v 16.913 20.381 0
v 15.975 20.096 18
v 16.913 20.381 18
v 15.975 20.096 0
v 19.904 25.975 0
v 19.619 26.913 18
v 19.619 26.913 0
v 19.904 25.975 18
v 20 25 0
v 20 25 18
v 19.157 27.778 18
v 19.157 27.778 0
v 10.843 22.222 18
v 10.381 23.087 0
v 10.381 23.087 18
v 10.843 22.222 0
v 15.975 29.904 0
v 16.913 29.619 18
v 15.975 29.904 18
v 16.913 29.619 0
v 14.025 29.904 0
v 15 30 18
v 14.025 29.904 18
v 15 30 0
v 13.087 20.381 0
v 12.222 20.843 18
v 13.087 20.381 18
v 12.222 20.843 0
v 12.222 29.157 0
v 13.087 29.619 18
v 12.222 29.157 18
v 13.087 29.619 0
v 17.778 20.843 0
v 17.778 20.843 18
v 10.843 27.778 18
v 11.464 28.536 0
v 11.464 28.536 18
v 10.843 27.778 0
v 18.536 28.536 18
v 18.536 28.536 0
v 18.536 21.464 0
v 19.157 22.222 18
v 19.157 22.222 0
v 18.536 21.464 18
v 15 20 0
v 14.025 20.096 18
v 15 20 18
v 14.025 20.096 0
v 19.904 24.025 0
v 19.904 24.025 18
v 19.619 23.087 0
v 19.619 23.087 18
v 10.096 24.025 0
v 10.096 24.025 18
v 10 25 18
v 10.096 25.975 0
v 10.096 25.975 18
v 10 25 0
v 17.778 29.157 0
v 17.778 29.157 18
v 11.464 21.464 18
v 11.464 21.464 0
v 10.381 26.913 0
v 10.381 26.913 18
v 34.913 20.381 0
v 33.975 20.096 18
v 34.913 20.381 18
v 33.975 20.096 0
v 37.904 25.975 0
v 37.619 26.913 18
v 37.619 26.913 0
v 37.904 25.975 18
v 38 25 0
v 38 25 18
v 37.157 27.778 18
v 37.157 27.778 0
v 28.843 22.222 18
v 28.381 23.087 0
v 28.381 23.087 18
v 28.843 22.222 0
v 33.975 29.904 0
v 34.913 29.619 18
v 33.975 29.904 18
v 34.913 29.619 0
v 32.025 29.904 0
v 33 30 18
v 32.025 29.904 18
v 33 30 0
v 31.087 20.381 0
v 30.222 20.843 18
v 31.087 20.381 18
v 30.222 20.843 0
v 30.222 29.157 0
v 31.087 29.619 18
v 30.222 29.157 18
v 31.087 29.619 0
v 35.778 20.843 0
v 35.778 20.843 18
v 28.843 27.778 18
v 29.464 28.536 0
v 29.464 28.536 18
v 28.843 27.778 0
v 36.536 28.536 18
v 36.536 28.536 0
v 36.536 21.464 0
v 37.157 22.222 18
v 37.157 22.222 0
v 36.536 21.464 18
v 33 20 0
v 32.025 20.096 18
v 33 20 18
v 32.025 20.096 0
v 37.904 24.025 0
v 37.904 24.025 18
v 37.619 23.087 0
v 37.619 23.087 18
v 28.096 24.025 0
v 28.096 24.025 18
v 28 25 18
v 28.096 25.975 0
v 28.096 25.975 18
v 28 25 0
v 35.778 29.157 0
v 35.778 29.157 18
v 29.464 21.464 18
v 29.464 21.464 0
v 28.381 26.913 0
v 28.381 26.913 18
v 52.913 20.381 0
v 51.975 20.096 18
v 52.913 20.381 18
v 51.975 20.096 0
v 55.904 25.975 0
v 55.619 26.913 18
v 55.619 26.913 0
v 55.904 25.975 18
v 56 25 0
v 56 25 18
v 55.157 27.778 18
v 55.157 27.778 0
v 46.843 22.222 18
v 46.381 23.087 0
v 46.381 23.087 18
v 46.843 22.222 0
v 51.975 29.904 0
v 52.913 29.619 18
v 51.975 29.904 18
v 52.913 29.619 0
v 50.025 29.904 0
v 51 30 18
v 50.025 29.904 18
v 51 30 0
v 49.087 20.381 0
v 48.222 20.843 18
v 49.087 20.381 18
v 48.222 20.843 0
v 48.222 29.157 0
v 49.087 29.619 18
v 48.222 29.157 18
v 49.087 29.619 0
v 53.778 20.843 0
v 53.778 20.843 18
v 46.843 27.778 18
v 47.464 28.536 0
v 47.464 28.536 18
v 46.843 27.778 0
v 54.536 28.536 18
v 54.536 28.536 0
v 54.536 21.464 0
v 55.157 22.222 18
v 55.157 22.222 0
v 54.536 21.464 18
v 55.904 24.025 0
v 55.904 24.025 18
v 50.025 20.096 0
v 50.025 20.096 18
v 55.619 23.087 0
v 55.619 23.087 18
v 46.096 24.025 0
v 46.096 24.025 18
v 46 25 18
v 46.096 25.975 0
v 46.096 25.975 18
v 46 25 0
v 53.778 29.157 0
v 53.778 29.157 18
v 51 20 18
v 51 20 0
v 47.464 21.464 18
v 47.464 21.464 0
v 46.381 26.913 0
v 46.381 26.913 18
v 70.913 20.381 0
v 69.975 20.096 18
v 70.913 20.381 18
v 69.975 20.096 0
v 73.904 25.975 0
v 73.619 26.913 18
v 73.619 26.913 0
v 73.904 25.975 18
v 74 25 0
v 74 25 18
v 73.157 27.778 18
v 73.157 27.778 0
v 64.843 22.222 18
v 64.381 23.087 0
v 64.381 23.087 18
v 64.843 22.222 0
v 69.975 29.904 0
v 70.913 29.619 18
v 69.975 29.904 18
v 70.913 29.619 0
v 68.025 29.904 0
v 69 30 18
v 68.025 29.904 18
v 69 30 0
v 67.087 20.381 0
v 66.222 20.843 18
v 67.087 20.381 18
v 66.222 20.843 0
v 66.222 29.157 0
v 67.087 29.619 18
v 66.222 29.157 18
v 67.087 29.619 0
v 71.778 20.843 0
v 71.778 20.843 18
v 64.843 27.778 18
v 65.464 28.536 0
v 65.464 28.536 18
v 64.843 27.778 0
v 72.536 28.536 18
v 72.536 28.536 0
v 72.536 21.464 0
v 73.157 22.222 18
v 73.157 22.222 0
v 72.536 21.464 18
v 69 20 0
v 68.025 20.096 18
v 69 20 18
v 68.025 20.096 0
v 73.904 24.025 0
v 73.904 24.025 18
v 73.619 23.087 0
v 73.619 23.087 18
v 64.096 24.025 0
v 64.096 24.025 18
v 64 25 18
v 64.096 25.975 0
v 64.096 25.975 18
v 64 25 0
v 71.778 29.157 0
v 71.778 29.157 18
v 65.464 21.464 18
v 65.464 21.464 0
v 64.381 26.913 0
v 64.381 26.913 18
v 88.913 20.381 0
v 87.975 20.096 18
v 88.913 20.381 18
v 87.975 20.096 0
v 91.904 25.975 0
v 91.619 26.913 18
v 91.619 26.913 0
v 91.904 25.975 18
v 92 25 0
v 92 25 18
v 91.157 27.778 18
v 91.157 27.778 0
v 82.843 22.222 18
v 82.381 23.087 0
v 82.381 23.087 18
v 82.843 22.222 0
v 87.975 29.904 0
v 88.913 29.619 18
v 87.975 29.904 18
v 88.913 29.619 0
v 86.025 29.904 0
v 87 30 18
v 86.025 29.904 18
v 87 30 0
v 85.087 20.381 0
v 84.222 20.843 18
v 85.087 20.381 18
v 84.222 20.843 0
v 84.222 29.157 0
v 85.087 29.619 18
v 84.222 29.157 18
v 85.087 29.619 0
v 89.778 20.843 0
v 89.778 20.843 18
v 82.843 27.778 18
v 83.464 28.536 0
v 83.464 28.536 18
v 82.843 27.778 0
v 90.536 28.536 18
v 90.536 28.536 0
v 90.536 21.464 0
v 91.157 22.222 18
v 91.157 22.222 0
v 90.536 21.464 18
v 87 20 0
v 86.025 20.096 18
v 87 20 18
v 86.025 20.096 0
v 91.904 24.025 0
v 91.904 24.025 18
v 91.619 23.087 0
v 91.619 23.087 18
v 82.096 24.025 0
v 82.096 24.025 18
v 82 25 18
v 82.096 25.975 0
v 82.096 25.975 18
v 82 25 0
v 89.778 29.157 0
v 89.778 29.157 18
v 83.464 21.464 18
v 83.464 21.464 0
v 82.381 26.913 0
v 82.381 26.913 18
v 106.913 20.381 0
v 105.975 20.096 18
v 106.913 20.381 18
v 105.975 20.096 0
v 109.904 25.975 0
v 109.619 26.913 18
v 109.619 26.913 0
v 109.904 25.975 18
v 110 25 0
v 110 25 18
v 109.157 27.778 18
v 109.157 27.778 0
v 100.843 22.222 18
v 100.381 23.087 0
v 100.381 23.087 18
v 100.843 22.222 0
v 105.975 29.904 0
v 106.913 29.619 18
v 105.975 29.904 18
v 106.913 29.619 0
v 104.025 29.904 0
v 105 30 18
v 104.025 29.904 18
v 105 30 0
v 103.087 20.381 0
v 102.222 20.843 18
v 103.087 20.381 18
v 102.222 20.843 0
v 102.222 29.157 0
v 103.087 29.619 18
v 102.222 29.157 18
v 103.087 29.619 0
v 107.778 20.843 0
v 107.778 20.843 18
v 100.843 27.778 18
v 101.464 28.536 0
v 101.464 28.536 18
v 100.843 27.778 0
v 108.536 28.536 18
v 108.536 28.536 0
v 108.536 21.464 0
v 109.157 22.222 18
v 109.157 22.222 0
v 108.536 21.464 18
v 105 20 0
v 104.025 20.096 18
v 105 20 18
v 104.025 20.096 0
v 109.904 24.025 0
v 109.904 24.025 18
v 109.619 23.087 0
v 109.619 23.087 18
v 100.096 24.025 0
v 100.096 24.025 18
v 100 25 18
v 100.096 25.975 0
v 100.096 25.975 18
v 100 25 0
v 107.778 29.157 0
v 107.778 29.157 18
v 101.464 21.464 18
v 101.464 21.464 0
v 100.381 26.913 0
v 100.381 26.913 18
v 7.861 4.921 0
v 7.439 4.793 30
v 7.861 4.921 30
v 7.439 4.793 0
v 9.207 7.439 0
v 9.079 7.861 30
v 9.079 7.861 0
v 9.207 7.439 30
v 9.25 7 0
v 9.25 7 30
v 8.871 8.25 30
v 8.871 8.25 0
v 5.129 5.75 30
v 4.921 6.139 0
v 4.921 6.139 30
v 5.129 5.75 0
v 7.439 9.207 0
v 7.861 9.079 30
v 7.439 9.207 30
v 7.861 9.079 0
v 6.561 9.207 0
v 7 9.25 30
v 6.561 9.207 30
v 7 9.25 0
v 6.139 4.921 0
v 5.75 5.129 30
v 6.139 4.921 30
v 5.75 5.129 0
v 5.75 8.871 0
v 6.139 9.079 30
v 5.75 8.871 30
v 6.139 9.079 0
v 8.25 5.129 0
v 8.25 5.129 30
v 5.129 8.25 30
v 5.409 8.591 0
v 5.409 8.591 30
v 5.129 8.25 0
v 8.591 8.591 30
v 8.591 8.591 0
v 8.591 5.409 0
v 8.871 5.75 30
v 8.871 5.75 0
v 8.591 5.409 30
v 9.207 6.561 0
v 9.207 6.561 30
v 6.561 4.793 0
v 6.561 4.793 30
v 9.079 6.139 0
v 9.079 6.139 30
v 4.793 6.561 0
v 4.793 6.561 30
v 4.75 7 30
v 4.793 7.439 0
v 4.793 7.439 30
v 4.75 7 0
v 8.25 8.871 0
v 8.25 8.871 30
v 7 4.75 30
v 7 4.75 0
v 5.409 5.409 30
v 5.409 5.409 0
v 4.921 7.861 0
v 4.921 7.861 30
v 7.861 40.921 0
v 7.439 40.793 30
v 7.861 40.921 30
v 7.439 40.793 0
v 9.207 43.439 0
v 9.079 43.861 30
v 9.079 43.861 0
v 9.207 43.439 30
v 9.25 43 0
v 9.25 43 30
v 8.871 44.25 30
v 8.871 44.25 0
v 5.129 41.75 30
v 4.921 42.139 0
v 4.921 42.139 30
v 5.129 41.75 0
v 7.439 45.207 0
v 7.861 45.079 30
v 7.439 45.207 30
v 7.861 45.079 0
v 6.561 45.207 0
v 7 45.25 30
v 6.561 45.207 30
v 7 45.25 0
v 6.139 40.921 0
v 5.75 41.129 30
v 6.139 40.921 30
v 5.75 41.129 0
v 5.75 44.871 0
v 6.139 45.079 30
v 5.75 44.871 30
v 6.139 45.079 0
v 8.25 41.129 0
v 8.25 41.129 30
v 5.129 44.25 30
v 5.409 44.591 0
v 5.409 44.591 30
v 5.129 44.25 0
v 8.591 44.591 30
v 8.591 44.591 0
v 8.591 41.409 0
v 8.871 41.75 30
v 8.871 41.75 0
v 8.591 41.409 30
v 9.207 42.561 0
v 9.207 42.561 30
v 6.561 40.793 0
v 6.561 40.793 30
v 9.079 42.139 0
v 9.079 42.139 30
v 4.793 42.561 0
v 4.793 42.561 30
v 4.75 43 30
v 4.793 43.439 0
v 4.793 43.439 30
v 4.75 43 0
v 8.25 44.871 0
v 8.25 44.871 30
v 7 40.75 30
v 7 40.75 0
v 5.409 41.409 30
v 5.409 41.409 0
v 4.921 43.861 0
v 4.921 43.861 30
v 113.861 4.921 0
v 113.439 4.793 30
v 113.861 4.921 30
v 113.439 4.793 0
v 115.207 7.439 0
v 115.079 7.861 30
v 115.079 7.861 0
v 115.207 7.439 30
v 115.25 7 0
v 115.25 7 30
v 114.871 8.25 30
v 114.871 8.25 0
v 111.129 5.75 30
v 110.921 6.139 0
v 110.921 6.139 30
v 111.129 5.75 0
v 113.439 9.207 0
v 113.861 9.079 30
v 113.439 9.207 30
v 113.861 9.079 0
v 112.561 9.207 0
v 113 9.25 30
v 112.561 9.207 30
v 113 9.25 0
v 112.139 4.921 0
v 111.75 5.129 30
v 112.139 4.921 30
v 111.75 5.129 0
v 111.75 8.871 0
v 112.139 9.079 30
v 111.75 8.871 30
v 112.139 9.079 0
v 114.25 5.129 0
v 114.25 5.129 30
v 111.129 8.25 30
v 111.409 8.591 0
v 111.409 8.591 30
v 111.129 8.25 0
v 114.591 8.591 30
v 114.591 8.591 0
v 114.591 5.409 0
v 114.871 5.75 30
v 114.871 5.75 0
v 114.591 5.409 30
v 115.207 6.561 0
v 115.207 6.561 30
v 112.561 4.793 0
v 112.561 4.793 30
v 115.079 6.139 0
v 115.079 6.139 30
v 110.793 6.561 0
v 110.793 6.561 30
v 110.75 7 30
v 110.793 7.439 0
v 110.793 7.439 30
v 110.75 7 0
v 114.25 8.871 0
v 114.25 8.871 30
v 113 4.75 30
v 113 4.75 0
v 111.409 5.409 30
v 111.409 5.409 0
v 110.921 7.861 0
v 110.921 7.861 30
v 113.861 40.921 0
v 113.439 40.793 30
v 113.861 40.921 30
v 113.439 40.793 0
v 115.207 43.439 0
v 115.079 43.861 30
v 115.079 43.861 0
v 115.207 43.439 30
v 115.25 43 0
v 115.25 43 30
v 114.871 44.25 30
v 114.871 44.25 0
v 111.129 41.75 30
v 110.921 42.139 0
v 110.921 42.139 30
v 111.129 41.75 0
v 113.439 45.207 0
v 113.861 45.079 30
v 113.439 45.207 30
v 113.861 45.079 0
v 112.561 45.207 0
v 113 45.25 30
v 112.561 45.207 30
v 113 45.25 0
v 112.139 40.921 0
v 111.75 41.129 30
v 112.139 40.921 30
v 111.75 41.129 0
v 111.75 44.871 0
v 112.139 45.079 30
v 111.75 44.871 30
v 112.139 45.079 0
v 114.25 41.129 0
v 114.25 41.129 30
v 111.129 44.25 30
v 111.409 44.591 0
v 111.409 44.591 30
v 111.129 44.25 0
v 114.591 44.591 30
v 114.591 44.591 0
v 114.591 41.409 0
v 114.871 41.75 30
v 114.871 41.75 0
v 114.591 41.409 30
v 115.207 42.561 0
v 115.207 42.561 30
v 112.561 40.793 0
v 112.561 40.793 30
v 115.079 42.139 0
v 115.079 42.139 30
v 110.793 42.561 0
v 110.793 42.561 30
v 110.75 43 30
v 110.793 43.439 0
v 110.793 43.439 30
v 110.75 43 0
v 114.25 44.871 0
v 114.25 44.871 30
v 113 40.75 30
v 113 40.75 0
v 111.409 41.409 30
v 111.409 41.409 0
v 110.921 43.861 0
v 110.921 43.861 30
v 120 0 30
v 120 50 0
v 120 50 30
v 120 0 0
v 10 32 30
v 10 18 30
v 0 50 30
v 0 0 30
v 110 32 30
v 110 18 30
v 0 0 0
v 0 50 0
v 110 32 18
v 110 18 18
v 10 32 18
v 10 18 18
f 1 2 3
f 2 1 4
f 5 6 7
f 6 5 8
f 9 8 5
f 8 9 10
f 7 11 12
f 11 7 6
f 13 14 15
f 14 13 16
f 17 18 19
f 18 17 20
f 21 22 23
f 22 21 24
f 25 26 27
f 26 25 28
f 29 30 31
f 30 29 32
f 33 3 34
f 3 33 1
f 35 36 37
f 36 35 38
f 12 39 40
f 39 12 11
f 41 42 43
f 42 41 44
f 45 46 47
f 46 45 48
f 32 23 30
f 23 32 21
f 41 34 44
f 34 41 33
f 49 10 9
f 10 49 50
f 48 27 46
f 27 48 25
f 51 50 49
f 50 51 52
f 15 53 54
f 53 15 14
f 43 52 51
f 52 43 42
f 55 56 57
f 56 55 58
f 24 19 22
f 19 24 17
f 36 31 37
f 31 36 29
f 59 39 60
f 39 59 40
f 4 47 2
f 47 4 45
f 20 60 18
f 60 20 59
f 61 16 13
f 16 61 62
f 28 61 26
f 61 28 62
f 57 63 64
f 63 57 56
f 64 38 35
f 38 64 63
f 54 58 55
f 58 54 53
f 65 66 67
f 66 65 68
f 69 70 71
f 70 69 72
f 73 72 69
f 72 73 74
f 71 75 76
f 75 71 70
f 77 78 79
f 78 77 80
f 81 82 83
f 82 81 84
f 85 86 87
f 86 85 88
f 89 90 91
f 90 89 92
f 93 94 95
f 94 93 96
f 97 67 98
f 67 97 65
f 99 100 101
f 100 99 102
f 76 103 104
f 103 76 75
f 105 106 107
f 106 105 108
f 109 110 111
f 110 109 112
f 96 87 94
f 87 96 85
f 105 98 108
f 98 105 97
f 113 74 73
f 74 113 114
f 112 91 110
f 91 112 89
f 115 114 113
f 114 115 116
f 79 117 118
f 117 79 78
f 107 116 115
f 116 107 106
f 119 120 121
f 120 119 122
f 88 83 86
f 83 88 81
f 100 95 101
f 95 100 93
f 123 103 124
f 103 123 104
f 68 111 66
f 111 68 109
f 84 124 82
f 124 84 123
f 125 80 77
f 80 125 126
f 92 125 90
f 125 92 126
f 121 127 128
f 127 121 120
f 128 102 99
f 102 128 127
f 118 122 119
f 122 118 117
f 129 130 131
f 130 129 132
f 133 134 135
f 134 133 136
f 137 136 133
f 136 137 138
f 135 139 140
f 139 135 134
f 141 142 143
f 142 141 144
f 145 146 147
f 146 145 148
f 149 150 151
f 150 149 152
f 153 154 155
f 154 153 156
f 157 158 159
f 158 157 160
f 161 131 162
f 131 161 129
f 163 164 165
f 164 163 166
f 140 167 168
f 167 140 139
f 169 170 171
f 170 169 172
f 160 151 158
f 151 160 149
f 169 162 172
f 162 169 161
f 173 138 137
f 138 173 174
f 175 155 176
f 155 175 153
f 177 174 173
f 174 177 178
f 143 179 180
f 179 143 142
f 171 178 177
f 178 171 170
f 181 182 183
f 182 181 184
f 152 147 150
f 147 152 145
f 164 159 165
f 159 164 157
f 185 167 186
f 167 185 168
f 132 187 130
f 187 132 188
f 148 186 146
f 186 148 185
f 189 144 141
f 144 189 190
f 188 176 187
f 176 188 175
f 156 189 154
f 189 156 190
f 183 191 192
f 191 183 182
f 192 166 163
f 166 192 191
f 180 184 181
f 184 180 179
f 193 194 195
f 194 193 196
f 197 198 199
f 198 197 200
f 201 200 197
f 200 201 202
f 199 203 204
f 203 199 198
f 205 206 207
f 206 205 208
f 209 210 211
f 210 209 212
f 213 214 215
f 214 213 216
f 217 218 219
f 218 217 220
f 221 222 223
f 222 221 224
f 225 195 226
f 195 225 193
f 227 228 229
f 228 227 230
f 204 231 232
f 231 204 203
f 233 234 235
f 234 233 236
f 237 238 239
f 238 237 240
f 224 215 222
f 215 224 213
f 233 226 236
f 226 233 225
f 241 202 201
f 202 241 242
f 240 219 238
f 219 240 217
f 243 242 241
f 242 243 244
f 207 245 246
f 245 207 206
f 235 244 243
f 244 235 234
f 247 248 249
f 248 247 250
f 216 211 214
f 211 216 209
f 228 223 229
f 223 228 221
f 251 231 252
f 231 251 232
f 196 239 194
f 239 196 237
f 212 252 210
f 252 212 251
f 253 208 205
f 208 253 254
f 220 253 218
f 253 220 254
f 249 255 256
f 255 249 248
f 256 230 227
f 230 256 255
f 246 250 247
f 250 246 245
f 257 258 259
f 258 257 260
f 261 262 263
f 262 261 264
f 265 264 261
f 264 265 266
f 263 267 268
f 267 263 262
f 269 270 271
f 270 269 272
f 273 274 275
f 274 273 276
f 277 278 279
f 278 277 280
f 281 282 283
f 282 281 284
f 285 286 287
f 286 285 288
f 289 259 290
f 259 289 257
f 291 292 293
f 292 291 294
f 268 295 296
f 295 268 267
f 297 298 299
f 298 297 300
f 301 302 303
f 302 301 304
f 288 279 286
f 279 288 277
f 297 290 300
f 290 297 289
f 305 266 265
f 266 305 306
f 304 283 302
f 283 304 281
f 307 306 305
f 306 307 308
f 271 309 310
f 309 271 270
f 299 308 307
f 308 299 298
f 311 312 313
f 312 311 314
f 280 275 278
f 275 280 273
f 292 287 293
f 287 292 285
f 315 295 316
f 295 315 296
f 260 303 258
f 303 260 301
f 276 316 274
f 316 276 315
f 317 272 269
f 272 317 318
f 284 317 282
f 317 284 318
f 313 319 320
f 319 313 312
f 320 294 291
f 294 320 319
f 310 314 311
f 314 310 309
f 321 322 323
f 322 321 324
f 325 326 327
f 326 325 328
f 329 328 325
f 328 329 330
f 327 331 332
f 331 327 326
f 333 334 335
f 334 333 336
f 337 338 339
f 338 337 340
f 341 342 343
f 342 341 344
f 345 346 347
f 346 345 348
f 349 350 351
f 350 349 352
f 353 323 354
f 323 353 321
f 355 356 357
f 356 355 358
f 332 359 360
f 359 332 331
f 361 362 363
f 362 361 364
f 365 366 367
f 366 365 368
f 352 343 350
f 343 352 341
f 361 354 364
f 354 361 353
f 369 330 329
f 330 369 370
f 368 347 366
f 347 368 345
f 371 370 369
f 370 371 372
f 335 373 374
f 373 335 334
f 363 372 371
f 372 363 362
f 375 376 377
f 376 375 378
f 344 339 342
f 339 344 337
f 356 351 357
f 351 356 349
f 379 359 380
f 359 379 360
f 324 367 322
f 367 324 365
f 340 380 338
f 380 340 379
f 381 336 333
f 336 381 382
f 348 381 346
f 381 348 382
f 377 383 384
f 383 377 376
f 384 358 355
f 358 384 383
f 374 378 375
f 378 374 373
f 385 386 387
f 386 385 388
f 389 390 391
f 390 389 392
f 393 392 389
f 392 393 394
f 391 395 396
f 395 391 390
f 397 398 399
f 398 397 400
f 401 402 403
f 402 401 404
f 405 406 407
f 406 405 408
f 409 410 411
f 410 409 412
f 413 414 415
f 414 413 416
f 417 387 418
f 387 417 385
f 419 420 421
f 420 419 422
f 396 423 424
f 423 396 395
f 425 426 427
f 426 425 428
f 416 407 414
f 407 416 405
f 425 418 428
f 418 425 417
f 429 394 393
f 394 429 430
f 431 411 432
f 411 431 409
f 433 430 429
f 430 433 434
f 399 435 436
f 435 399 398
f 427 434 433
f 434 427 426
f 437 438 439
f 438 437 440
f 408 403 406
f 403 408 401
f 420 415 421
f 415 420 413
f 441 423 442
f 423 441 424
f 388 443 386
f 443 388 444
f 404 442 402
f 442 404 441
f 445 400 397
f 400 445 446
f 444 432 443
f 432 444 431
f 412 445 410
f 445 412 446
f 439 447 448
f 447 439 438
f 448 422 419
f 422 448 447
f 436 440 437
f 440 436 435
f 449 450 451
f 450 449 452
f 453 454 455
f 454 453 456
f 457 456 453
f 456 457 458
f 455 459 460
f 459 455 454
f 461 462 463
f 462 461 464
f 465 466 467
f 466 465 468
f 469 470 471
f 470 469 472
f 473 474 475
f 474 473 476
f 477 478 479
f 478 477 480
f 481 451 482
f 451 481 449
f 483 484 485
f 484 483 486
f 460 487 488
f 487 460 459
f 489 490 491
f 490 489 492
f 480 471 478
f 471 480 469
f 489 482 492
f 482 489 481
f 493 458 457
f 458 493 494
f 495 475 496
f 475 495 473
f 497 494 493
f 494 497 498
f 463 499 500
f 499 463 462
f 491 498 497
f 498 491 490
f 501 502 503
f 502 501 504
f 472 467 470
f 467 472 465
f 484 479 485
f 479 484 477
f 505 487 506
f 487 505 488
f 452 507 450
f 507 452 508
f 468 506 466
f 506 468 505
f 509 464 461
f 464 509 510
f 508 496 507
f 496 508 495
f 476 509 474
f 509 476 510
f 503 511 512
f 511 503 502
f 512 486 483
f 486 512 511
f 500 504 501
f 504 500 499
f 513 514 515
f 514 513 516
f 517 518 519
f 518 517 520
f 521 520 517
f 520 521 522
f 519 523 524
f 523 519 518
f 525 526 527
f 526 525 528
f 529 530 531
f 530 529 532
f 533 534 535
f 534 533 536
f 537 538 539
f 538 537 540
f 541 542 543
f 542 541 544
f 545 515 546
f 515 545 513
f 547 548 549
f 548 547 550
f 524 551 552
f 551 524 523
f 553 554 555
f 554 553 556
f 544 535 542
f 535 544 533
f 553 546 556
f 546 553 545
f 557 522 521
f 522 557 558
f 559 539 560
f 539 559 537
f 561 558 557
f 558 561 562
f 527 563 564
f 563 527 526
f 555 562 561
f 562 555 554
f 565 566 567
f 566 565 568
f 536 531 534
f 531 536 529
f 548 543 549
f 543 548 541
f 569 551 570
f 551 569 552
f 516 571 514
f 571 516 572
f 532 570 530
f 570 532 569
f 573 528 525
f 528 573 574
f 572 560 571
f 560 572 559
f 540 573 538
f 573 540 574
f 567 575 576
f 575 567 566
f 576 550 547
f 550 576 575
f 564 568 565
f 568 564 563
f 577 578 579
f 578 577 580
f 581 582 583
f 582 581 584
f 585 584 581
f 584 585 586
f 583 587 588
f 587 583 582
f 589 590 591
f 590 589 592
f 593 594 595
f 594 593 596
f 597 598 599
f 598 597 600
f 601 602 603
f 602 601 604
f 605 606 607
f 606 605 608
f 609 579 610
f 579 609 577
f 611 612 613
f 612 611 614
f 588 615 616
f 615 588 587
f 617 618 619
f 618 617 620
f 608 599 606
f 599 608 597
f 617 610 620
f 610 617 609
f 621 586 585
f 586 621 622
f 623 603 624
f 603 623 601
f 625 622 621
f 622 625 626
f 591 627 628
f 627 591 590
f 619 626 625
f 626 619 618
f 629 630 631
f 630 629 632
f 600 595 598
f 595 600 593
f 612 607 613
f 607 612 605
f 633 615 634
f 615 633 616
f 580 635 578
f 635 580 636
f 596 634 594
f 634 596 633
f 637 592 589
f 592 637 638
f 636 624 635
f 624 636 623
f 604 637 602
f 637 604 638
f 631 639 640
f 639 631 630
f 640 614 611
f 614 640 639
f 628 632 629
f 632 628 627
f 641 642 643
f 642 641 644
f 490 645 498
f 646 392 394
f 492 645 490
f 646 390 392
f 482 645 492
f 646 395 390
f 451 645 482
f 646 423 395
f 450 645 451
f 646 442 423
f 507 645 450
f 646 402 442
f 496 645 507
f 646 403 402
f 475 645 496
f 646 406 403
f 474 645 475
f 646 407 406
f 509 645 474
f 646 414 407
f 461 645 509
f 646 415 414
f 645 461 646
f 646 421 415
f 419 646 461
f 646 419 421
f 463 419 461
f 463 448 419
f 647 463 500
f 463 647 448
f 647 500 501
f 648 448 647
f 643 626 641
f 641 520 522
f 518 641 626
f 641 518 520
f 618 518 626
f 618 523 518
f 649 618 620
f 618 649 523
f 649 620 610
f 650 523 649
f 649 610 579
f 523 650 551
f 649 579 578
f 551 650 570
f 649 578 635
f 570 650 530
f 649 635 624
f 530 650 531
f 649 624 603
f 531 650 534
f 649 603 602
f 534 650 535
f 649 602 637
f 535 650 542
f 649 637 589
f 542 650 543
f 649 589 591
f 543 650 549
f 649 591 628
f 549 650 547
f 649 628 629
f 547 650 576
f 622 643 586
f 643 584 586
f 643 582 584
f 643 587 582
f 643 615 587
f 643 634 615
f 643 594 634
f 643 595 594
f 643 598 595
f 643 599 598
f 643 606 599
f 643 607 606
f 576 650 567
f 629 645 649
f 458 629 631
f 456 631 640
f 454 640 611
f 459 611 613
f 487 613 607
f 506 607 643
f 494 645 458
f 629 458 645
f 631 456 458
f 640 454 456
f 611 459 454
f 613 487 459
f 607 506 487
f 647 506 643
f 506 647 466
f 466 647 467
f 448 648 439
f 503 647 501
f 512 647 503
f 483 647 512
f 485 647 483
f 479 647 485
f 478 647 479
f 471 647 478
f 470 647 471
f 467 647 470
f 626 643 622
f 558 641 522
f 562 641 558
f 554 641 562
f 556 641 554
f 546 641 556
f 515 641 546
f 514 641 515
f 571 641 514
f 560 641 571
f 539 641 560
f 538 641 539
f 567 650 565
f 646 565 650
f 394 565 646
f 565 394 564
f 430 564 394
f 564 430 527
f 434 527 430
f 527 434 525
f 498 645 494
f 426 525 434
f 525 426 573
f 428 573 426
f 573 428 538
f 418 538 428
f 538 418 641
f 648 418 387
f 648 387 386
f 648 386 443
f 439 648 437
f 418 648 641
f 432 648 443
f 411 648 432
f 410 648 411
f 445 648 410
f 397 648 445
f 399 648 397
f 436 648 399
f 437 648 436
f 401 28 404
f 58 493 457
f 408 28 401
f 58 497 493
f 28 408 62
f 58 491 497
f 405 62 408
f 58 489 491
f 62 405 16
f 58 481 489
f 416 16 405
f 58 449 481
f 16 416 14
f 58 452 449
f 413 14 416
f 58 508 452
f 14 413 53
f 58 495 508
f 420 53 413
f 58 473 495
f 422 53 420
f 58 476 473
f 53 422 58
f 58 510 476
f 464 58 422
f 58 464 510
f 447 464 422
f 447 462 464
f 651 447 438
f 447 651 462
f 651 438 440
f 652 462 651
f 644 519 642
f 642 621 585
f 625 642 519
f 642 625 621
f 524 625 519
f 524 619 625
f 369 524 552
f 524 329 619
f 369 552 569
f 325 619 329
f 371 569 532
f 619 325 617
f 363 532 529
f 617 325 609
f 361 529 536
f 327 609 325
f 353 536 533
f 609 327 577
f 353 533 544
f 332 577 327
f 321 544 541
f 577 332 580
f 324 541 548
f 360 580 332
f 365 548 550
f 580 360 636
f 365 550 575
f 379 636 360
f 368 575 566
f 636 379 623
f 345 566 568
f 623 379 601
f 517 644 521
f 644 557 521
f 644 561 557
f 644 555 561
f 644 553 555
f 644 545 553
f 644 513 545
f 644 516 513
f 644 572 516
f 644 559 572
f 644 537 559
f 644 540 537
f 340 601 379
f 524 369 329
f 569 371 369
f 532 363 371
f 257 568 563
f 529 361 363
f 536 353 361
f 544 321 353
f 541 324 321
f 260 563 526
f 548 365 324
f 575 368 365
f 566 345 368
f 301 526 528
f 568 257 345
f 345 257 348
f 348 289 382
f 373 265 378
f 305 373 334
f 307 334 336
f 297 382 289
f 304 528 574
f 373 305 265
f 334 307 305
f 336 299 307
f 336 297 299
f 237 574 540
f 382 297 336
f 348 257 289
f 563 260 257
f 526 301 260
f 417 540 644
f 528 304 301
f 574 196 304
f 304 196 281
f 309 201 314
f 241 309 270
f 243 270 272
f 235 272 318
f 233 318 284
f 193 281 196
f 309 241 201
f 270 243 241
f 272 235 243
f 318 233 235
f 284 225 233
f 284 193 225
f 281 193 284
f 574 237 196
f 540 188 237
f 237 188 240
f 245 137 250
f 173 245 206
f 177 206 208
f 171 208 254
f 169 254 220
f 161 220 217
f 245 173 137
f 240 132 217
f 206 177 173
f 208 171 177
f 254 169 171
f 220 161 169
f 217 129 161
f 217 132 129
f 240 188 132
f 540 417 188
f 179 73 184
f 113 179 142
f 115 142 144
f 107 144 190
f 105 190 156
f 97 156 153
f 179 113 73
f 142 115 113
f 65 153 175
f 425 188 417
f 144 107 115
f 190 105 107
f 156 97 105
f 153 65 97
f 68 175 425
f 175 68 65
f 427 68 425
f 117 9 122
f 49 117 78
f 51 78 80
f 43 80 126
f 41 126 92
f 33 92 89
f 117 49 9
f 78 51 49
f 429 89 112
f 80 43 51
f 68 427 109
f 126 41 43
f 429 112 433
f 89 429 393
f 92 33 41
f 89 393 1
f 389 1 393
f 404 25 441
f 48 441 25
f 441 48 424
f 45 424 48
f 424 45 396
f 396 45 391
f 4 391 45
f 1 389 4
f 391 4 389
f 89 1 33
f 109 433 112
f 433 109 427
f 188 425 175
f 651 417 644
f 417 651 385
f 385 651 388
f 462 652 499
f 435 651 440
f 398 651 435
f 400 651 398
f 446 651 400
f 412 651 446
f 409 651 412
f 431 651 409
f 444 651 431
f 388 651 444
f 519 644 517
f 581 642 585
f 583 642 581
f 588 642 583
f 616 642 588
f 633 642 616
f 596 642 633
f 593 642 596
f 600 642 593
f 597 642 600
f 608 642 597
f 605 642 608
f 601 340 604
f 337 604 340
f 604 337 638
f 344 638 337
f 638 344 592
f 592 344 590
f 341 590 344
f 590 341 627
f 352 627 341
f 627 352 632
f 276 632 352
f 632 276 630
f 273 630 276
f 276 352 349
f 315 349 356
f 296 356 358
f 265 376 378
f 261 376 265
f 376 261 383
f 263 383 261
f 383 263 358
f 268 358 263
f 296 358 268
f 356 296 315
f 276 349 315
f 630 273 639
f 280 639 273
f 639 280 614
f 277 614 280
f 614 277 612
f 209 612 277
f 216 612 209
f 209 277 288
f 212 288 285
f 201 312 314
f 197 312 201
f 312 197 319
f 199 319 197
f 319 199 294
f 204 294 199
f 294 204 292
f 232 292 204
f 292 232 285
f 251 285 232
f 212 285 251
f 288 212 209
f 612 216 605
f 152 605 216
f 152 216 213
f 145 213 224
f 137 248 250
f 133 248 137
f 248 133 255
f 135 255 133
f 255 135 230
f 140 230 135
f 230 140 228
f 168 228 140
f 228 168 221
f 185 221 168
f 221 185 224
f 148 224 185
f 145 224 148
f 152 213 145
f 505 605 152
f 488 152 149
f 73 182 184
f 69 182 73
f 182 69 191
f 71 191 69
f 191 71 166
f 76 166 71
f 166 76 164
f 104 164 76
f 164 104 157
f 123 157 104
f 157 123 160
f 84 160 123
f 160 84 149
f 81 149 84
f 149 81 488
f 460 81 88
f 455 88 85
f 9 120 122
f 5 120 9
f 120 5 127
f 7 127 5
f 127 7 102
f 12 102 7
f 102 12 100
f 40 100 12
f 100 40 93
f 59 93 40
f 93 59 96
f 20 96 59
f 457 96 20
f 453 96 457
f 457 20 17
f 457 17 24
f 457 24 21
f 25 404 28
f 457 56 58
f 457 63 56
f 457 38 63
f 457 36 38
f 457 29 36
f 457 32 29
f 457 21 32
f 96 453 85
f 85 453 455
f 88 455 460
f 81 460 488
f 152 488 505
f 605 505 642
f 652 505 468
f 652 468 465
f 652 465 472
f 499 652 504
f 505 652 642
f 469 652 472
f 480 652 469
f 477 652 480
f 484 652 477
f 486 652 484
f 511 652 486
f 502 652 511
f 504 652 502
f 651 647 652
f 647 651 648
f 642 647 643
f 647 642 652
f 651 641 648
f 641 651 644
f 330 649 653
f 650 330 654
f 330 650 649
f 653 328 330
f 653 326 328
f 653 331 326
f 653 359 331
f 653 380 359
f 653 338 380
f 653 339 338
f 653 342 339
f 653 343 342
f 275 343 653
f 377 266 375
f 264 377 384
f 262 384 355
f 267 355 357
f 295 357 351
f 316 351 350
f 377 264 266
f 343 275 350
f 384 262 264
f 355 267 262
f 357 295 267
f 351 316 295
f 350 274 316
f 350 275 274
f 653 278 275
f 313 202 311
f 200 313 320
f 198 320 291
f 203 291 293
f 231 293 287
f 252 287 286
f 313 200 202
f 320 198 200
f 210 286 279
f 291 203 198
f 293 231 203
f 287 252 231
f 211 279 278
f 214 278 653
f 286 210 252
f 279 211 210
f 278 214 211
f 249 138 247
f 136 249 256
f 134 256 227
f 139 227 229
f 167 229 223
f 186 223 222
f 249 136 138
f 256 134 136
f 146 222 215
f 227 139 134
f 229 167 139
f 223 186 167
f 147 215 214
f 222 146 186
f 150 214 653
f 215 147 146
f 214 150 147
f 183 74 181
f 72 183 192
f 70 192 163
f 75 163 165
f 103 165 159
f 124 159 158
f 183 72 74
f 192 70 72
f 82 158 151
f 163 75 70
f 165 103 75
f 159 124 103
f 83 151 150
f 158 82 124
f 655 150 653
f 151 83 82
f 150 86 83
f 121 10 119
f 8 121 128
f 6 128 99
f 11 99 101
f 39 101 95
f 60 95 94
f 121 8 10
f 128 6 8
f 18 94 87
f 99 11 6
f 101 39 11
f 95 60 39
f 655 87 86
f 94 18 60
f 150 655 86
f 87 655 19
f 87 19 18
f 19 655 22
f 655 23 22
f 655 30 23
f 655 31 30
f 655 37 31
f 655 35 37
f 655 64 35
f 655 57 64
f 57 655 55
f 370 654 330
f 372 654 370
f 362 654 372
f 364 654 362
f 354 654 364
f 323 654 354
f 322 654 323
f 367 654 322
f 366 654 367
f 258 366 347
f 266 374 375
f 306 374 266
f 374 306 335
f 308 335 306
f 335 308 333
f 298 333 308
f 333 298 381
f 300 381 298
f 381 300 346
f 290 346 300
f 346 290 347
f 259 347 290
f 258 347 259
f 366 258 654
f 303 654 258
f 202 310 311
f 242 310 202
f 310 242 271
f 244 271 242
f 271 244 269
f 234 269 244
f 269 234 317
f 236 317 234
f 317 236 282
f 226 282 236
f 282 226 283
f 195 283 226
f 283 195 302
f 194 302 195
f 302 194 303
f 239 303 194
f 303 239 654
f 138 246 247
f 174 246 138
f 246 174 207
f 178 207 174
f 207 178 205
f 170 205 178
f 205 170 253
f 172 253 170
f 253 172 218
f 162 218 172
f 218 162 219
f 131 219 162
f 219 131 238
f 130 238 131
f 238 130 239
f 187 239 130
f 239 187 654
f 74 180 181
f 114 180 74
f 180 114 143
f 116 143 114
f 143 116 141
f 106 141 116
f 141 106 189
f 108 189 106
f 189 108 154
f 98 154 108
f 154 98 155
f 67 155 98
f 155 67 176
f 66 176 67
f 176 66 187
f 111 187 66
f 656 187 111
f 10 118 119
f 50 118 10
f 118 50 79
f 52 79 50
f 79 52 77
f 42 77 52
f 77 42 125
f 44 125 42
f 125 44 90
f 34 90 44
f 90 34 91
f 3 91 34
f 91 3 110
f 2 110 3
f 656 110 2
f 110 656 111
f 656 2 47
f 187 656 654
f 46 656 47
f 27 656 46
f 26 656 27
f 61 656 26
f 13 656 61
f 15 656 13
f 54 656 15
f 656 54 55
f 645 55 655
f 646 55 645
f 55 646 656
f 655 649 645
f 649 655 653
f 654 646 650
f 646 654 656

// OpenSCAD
$fn = 32;

// ----------------------------------------------------------------------
// Manifold block: gallery_top manifold
// ----------------------------------------------------------------------

// --- parameters (mm) ---
block_l = 120;            // block length, X
block_w = 50;             // block width, Y
block_h = 30;             // block height, Z
port_d = 10;              // port bore diameter
port_pitch = 18;          // port pitch along X
gallery_d = 14;           // top gallery width, Y
gallery_depth = 12;       // gallery pocket depth
wall_p = 10;              // gallery end wall thickness, X
mnt_d = 4.5;              // mounting hole diameter
mnt_in = 7;               // mounting hole inset from the edges

n_ports = 6;  // ports in the row
port_x0 = (block_l - (n_ports - 1) * port_pitch) / 2;  // first port X

difference() {
  cube([block_l, block_w, block_h]);
  for (i = [0 : n_ports - 1])
    translate([port_x0 + i * port_pitch, block_w / 2, -1])
      cylinder(h = block_h + 2, d = port_d);
  translate([wall_p, block_w / 2 - gallery_d / 2, block_h - gallery_depth])
    cube([block_l - 2 * wall_p, gallery_d, gallery_depth + 1]);
  for (cx = [mnt_in, block_l - mnt_in])
    for (cy = [mnt_in, block_w - mnt_in])
      translate([cx, cy, -1]) cylinder(h = block_h + 2, d = mnt_d);
}
